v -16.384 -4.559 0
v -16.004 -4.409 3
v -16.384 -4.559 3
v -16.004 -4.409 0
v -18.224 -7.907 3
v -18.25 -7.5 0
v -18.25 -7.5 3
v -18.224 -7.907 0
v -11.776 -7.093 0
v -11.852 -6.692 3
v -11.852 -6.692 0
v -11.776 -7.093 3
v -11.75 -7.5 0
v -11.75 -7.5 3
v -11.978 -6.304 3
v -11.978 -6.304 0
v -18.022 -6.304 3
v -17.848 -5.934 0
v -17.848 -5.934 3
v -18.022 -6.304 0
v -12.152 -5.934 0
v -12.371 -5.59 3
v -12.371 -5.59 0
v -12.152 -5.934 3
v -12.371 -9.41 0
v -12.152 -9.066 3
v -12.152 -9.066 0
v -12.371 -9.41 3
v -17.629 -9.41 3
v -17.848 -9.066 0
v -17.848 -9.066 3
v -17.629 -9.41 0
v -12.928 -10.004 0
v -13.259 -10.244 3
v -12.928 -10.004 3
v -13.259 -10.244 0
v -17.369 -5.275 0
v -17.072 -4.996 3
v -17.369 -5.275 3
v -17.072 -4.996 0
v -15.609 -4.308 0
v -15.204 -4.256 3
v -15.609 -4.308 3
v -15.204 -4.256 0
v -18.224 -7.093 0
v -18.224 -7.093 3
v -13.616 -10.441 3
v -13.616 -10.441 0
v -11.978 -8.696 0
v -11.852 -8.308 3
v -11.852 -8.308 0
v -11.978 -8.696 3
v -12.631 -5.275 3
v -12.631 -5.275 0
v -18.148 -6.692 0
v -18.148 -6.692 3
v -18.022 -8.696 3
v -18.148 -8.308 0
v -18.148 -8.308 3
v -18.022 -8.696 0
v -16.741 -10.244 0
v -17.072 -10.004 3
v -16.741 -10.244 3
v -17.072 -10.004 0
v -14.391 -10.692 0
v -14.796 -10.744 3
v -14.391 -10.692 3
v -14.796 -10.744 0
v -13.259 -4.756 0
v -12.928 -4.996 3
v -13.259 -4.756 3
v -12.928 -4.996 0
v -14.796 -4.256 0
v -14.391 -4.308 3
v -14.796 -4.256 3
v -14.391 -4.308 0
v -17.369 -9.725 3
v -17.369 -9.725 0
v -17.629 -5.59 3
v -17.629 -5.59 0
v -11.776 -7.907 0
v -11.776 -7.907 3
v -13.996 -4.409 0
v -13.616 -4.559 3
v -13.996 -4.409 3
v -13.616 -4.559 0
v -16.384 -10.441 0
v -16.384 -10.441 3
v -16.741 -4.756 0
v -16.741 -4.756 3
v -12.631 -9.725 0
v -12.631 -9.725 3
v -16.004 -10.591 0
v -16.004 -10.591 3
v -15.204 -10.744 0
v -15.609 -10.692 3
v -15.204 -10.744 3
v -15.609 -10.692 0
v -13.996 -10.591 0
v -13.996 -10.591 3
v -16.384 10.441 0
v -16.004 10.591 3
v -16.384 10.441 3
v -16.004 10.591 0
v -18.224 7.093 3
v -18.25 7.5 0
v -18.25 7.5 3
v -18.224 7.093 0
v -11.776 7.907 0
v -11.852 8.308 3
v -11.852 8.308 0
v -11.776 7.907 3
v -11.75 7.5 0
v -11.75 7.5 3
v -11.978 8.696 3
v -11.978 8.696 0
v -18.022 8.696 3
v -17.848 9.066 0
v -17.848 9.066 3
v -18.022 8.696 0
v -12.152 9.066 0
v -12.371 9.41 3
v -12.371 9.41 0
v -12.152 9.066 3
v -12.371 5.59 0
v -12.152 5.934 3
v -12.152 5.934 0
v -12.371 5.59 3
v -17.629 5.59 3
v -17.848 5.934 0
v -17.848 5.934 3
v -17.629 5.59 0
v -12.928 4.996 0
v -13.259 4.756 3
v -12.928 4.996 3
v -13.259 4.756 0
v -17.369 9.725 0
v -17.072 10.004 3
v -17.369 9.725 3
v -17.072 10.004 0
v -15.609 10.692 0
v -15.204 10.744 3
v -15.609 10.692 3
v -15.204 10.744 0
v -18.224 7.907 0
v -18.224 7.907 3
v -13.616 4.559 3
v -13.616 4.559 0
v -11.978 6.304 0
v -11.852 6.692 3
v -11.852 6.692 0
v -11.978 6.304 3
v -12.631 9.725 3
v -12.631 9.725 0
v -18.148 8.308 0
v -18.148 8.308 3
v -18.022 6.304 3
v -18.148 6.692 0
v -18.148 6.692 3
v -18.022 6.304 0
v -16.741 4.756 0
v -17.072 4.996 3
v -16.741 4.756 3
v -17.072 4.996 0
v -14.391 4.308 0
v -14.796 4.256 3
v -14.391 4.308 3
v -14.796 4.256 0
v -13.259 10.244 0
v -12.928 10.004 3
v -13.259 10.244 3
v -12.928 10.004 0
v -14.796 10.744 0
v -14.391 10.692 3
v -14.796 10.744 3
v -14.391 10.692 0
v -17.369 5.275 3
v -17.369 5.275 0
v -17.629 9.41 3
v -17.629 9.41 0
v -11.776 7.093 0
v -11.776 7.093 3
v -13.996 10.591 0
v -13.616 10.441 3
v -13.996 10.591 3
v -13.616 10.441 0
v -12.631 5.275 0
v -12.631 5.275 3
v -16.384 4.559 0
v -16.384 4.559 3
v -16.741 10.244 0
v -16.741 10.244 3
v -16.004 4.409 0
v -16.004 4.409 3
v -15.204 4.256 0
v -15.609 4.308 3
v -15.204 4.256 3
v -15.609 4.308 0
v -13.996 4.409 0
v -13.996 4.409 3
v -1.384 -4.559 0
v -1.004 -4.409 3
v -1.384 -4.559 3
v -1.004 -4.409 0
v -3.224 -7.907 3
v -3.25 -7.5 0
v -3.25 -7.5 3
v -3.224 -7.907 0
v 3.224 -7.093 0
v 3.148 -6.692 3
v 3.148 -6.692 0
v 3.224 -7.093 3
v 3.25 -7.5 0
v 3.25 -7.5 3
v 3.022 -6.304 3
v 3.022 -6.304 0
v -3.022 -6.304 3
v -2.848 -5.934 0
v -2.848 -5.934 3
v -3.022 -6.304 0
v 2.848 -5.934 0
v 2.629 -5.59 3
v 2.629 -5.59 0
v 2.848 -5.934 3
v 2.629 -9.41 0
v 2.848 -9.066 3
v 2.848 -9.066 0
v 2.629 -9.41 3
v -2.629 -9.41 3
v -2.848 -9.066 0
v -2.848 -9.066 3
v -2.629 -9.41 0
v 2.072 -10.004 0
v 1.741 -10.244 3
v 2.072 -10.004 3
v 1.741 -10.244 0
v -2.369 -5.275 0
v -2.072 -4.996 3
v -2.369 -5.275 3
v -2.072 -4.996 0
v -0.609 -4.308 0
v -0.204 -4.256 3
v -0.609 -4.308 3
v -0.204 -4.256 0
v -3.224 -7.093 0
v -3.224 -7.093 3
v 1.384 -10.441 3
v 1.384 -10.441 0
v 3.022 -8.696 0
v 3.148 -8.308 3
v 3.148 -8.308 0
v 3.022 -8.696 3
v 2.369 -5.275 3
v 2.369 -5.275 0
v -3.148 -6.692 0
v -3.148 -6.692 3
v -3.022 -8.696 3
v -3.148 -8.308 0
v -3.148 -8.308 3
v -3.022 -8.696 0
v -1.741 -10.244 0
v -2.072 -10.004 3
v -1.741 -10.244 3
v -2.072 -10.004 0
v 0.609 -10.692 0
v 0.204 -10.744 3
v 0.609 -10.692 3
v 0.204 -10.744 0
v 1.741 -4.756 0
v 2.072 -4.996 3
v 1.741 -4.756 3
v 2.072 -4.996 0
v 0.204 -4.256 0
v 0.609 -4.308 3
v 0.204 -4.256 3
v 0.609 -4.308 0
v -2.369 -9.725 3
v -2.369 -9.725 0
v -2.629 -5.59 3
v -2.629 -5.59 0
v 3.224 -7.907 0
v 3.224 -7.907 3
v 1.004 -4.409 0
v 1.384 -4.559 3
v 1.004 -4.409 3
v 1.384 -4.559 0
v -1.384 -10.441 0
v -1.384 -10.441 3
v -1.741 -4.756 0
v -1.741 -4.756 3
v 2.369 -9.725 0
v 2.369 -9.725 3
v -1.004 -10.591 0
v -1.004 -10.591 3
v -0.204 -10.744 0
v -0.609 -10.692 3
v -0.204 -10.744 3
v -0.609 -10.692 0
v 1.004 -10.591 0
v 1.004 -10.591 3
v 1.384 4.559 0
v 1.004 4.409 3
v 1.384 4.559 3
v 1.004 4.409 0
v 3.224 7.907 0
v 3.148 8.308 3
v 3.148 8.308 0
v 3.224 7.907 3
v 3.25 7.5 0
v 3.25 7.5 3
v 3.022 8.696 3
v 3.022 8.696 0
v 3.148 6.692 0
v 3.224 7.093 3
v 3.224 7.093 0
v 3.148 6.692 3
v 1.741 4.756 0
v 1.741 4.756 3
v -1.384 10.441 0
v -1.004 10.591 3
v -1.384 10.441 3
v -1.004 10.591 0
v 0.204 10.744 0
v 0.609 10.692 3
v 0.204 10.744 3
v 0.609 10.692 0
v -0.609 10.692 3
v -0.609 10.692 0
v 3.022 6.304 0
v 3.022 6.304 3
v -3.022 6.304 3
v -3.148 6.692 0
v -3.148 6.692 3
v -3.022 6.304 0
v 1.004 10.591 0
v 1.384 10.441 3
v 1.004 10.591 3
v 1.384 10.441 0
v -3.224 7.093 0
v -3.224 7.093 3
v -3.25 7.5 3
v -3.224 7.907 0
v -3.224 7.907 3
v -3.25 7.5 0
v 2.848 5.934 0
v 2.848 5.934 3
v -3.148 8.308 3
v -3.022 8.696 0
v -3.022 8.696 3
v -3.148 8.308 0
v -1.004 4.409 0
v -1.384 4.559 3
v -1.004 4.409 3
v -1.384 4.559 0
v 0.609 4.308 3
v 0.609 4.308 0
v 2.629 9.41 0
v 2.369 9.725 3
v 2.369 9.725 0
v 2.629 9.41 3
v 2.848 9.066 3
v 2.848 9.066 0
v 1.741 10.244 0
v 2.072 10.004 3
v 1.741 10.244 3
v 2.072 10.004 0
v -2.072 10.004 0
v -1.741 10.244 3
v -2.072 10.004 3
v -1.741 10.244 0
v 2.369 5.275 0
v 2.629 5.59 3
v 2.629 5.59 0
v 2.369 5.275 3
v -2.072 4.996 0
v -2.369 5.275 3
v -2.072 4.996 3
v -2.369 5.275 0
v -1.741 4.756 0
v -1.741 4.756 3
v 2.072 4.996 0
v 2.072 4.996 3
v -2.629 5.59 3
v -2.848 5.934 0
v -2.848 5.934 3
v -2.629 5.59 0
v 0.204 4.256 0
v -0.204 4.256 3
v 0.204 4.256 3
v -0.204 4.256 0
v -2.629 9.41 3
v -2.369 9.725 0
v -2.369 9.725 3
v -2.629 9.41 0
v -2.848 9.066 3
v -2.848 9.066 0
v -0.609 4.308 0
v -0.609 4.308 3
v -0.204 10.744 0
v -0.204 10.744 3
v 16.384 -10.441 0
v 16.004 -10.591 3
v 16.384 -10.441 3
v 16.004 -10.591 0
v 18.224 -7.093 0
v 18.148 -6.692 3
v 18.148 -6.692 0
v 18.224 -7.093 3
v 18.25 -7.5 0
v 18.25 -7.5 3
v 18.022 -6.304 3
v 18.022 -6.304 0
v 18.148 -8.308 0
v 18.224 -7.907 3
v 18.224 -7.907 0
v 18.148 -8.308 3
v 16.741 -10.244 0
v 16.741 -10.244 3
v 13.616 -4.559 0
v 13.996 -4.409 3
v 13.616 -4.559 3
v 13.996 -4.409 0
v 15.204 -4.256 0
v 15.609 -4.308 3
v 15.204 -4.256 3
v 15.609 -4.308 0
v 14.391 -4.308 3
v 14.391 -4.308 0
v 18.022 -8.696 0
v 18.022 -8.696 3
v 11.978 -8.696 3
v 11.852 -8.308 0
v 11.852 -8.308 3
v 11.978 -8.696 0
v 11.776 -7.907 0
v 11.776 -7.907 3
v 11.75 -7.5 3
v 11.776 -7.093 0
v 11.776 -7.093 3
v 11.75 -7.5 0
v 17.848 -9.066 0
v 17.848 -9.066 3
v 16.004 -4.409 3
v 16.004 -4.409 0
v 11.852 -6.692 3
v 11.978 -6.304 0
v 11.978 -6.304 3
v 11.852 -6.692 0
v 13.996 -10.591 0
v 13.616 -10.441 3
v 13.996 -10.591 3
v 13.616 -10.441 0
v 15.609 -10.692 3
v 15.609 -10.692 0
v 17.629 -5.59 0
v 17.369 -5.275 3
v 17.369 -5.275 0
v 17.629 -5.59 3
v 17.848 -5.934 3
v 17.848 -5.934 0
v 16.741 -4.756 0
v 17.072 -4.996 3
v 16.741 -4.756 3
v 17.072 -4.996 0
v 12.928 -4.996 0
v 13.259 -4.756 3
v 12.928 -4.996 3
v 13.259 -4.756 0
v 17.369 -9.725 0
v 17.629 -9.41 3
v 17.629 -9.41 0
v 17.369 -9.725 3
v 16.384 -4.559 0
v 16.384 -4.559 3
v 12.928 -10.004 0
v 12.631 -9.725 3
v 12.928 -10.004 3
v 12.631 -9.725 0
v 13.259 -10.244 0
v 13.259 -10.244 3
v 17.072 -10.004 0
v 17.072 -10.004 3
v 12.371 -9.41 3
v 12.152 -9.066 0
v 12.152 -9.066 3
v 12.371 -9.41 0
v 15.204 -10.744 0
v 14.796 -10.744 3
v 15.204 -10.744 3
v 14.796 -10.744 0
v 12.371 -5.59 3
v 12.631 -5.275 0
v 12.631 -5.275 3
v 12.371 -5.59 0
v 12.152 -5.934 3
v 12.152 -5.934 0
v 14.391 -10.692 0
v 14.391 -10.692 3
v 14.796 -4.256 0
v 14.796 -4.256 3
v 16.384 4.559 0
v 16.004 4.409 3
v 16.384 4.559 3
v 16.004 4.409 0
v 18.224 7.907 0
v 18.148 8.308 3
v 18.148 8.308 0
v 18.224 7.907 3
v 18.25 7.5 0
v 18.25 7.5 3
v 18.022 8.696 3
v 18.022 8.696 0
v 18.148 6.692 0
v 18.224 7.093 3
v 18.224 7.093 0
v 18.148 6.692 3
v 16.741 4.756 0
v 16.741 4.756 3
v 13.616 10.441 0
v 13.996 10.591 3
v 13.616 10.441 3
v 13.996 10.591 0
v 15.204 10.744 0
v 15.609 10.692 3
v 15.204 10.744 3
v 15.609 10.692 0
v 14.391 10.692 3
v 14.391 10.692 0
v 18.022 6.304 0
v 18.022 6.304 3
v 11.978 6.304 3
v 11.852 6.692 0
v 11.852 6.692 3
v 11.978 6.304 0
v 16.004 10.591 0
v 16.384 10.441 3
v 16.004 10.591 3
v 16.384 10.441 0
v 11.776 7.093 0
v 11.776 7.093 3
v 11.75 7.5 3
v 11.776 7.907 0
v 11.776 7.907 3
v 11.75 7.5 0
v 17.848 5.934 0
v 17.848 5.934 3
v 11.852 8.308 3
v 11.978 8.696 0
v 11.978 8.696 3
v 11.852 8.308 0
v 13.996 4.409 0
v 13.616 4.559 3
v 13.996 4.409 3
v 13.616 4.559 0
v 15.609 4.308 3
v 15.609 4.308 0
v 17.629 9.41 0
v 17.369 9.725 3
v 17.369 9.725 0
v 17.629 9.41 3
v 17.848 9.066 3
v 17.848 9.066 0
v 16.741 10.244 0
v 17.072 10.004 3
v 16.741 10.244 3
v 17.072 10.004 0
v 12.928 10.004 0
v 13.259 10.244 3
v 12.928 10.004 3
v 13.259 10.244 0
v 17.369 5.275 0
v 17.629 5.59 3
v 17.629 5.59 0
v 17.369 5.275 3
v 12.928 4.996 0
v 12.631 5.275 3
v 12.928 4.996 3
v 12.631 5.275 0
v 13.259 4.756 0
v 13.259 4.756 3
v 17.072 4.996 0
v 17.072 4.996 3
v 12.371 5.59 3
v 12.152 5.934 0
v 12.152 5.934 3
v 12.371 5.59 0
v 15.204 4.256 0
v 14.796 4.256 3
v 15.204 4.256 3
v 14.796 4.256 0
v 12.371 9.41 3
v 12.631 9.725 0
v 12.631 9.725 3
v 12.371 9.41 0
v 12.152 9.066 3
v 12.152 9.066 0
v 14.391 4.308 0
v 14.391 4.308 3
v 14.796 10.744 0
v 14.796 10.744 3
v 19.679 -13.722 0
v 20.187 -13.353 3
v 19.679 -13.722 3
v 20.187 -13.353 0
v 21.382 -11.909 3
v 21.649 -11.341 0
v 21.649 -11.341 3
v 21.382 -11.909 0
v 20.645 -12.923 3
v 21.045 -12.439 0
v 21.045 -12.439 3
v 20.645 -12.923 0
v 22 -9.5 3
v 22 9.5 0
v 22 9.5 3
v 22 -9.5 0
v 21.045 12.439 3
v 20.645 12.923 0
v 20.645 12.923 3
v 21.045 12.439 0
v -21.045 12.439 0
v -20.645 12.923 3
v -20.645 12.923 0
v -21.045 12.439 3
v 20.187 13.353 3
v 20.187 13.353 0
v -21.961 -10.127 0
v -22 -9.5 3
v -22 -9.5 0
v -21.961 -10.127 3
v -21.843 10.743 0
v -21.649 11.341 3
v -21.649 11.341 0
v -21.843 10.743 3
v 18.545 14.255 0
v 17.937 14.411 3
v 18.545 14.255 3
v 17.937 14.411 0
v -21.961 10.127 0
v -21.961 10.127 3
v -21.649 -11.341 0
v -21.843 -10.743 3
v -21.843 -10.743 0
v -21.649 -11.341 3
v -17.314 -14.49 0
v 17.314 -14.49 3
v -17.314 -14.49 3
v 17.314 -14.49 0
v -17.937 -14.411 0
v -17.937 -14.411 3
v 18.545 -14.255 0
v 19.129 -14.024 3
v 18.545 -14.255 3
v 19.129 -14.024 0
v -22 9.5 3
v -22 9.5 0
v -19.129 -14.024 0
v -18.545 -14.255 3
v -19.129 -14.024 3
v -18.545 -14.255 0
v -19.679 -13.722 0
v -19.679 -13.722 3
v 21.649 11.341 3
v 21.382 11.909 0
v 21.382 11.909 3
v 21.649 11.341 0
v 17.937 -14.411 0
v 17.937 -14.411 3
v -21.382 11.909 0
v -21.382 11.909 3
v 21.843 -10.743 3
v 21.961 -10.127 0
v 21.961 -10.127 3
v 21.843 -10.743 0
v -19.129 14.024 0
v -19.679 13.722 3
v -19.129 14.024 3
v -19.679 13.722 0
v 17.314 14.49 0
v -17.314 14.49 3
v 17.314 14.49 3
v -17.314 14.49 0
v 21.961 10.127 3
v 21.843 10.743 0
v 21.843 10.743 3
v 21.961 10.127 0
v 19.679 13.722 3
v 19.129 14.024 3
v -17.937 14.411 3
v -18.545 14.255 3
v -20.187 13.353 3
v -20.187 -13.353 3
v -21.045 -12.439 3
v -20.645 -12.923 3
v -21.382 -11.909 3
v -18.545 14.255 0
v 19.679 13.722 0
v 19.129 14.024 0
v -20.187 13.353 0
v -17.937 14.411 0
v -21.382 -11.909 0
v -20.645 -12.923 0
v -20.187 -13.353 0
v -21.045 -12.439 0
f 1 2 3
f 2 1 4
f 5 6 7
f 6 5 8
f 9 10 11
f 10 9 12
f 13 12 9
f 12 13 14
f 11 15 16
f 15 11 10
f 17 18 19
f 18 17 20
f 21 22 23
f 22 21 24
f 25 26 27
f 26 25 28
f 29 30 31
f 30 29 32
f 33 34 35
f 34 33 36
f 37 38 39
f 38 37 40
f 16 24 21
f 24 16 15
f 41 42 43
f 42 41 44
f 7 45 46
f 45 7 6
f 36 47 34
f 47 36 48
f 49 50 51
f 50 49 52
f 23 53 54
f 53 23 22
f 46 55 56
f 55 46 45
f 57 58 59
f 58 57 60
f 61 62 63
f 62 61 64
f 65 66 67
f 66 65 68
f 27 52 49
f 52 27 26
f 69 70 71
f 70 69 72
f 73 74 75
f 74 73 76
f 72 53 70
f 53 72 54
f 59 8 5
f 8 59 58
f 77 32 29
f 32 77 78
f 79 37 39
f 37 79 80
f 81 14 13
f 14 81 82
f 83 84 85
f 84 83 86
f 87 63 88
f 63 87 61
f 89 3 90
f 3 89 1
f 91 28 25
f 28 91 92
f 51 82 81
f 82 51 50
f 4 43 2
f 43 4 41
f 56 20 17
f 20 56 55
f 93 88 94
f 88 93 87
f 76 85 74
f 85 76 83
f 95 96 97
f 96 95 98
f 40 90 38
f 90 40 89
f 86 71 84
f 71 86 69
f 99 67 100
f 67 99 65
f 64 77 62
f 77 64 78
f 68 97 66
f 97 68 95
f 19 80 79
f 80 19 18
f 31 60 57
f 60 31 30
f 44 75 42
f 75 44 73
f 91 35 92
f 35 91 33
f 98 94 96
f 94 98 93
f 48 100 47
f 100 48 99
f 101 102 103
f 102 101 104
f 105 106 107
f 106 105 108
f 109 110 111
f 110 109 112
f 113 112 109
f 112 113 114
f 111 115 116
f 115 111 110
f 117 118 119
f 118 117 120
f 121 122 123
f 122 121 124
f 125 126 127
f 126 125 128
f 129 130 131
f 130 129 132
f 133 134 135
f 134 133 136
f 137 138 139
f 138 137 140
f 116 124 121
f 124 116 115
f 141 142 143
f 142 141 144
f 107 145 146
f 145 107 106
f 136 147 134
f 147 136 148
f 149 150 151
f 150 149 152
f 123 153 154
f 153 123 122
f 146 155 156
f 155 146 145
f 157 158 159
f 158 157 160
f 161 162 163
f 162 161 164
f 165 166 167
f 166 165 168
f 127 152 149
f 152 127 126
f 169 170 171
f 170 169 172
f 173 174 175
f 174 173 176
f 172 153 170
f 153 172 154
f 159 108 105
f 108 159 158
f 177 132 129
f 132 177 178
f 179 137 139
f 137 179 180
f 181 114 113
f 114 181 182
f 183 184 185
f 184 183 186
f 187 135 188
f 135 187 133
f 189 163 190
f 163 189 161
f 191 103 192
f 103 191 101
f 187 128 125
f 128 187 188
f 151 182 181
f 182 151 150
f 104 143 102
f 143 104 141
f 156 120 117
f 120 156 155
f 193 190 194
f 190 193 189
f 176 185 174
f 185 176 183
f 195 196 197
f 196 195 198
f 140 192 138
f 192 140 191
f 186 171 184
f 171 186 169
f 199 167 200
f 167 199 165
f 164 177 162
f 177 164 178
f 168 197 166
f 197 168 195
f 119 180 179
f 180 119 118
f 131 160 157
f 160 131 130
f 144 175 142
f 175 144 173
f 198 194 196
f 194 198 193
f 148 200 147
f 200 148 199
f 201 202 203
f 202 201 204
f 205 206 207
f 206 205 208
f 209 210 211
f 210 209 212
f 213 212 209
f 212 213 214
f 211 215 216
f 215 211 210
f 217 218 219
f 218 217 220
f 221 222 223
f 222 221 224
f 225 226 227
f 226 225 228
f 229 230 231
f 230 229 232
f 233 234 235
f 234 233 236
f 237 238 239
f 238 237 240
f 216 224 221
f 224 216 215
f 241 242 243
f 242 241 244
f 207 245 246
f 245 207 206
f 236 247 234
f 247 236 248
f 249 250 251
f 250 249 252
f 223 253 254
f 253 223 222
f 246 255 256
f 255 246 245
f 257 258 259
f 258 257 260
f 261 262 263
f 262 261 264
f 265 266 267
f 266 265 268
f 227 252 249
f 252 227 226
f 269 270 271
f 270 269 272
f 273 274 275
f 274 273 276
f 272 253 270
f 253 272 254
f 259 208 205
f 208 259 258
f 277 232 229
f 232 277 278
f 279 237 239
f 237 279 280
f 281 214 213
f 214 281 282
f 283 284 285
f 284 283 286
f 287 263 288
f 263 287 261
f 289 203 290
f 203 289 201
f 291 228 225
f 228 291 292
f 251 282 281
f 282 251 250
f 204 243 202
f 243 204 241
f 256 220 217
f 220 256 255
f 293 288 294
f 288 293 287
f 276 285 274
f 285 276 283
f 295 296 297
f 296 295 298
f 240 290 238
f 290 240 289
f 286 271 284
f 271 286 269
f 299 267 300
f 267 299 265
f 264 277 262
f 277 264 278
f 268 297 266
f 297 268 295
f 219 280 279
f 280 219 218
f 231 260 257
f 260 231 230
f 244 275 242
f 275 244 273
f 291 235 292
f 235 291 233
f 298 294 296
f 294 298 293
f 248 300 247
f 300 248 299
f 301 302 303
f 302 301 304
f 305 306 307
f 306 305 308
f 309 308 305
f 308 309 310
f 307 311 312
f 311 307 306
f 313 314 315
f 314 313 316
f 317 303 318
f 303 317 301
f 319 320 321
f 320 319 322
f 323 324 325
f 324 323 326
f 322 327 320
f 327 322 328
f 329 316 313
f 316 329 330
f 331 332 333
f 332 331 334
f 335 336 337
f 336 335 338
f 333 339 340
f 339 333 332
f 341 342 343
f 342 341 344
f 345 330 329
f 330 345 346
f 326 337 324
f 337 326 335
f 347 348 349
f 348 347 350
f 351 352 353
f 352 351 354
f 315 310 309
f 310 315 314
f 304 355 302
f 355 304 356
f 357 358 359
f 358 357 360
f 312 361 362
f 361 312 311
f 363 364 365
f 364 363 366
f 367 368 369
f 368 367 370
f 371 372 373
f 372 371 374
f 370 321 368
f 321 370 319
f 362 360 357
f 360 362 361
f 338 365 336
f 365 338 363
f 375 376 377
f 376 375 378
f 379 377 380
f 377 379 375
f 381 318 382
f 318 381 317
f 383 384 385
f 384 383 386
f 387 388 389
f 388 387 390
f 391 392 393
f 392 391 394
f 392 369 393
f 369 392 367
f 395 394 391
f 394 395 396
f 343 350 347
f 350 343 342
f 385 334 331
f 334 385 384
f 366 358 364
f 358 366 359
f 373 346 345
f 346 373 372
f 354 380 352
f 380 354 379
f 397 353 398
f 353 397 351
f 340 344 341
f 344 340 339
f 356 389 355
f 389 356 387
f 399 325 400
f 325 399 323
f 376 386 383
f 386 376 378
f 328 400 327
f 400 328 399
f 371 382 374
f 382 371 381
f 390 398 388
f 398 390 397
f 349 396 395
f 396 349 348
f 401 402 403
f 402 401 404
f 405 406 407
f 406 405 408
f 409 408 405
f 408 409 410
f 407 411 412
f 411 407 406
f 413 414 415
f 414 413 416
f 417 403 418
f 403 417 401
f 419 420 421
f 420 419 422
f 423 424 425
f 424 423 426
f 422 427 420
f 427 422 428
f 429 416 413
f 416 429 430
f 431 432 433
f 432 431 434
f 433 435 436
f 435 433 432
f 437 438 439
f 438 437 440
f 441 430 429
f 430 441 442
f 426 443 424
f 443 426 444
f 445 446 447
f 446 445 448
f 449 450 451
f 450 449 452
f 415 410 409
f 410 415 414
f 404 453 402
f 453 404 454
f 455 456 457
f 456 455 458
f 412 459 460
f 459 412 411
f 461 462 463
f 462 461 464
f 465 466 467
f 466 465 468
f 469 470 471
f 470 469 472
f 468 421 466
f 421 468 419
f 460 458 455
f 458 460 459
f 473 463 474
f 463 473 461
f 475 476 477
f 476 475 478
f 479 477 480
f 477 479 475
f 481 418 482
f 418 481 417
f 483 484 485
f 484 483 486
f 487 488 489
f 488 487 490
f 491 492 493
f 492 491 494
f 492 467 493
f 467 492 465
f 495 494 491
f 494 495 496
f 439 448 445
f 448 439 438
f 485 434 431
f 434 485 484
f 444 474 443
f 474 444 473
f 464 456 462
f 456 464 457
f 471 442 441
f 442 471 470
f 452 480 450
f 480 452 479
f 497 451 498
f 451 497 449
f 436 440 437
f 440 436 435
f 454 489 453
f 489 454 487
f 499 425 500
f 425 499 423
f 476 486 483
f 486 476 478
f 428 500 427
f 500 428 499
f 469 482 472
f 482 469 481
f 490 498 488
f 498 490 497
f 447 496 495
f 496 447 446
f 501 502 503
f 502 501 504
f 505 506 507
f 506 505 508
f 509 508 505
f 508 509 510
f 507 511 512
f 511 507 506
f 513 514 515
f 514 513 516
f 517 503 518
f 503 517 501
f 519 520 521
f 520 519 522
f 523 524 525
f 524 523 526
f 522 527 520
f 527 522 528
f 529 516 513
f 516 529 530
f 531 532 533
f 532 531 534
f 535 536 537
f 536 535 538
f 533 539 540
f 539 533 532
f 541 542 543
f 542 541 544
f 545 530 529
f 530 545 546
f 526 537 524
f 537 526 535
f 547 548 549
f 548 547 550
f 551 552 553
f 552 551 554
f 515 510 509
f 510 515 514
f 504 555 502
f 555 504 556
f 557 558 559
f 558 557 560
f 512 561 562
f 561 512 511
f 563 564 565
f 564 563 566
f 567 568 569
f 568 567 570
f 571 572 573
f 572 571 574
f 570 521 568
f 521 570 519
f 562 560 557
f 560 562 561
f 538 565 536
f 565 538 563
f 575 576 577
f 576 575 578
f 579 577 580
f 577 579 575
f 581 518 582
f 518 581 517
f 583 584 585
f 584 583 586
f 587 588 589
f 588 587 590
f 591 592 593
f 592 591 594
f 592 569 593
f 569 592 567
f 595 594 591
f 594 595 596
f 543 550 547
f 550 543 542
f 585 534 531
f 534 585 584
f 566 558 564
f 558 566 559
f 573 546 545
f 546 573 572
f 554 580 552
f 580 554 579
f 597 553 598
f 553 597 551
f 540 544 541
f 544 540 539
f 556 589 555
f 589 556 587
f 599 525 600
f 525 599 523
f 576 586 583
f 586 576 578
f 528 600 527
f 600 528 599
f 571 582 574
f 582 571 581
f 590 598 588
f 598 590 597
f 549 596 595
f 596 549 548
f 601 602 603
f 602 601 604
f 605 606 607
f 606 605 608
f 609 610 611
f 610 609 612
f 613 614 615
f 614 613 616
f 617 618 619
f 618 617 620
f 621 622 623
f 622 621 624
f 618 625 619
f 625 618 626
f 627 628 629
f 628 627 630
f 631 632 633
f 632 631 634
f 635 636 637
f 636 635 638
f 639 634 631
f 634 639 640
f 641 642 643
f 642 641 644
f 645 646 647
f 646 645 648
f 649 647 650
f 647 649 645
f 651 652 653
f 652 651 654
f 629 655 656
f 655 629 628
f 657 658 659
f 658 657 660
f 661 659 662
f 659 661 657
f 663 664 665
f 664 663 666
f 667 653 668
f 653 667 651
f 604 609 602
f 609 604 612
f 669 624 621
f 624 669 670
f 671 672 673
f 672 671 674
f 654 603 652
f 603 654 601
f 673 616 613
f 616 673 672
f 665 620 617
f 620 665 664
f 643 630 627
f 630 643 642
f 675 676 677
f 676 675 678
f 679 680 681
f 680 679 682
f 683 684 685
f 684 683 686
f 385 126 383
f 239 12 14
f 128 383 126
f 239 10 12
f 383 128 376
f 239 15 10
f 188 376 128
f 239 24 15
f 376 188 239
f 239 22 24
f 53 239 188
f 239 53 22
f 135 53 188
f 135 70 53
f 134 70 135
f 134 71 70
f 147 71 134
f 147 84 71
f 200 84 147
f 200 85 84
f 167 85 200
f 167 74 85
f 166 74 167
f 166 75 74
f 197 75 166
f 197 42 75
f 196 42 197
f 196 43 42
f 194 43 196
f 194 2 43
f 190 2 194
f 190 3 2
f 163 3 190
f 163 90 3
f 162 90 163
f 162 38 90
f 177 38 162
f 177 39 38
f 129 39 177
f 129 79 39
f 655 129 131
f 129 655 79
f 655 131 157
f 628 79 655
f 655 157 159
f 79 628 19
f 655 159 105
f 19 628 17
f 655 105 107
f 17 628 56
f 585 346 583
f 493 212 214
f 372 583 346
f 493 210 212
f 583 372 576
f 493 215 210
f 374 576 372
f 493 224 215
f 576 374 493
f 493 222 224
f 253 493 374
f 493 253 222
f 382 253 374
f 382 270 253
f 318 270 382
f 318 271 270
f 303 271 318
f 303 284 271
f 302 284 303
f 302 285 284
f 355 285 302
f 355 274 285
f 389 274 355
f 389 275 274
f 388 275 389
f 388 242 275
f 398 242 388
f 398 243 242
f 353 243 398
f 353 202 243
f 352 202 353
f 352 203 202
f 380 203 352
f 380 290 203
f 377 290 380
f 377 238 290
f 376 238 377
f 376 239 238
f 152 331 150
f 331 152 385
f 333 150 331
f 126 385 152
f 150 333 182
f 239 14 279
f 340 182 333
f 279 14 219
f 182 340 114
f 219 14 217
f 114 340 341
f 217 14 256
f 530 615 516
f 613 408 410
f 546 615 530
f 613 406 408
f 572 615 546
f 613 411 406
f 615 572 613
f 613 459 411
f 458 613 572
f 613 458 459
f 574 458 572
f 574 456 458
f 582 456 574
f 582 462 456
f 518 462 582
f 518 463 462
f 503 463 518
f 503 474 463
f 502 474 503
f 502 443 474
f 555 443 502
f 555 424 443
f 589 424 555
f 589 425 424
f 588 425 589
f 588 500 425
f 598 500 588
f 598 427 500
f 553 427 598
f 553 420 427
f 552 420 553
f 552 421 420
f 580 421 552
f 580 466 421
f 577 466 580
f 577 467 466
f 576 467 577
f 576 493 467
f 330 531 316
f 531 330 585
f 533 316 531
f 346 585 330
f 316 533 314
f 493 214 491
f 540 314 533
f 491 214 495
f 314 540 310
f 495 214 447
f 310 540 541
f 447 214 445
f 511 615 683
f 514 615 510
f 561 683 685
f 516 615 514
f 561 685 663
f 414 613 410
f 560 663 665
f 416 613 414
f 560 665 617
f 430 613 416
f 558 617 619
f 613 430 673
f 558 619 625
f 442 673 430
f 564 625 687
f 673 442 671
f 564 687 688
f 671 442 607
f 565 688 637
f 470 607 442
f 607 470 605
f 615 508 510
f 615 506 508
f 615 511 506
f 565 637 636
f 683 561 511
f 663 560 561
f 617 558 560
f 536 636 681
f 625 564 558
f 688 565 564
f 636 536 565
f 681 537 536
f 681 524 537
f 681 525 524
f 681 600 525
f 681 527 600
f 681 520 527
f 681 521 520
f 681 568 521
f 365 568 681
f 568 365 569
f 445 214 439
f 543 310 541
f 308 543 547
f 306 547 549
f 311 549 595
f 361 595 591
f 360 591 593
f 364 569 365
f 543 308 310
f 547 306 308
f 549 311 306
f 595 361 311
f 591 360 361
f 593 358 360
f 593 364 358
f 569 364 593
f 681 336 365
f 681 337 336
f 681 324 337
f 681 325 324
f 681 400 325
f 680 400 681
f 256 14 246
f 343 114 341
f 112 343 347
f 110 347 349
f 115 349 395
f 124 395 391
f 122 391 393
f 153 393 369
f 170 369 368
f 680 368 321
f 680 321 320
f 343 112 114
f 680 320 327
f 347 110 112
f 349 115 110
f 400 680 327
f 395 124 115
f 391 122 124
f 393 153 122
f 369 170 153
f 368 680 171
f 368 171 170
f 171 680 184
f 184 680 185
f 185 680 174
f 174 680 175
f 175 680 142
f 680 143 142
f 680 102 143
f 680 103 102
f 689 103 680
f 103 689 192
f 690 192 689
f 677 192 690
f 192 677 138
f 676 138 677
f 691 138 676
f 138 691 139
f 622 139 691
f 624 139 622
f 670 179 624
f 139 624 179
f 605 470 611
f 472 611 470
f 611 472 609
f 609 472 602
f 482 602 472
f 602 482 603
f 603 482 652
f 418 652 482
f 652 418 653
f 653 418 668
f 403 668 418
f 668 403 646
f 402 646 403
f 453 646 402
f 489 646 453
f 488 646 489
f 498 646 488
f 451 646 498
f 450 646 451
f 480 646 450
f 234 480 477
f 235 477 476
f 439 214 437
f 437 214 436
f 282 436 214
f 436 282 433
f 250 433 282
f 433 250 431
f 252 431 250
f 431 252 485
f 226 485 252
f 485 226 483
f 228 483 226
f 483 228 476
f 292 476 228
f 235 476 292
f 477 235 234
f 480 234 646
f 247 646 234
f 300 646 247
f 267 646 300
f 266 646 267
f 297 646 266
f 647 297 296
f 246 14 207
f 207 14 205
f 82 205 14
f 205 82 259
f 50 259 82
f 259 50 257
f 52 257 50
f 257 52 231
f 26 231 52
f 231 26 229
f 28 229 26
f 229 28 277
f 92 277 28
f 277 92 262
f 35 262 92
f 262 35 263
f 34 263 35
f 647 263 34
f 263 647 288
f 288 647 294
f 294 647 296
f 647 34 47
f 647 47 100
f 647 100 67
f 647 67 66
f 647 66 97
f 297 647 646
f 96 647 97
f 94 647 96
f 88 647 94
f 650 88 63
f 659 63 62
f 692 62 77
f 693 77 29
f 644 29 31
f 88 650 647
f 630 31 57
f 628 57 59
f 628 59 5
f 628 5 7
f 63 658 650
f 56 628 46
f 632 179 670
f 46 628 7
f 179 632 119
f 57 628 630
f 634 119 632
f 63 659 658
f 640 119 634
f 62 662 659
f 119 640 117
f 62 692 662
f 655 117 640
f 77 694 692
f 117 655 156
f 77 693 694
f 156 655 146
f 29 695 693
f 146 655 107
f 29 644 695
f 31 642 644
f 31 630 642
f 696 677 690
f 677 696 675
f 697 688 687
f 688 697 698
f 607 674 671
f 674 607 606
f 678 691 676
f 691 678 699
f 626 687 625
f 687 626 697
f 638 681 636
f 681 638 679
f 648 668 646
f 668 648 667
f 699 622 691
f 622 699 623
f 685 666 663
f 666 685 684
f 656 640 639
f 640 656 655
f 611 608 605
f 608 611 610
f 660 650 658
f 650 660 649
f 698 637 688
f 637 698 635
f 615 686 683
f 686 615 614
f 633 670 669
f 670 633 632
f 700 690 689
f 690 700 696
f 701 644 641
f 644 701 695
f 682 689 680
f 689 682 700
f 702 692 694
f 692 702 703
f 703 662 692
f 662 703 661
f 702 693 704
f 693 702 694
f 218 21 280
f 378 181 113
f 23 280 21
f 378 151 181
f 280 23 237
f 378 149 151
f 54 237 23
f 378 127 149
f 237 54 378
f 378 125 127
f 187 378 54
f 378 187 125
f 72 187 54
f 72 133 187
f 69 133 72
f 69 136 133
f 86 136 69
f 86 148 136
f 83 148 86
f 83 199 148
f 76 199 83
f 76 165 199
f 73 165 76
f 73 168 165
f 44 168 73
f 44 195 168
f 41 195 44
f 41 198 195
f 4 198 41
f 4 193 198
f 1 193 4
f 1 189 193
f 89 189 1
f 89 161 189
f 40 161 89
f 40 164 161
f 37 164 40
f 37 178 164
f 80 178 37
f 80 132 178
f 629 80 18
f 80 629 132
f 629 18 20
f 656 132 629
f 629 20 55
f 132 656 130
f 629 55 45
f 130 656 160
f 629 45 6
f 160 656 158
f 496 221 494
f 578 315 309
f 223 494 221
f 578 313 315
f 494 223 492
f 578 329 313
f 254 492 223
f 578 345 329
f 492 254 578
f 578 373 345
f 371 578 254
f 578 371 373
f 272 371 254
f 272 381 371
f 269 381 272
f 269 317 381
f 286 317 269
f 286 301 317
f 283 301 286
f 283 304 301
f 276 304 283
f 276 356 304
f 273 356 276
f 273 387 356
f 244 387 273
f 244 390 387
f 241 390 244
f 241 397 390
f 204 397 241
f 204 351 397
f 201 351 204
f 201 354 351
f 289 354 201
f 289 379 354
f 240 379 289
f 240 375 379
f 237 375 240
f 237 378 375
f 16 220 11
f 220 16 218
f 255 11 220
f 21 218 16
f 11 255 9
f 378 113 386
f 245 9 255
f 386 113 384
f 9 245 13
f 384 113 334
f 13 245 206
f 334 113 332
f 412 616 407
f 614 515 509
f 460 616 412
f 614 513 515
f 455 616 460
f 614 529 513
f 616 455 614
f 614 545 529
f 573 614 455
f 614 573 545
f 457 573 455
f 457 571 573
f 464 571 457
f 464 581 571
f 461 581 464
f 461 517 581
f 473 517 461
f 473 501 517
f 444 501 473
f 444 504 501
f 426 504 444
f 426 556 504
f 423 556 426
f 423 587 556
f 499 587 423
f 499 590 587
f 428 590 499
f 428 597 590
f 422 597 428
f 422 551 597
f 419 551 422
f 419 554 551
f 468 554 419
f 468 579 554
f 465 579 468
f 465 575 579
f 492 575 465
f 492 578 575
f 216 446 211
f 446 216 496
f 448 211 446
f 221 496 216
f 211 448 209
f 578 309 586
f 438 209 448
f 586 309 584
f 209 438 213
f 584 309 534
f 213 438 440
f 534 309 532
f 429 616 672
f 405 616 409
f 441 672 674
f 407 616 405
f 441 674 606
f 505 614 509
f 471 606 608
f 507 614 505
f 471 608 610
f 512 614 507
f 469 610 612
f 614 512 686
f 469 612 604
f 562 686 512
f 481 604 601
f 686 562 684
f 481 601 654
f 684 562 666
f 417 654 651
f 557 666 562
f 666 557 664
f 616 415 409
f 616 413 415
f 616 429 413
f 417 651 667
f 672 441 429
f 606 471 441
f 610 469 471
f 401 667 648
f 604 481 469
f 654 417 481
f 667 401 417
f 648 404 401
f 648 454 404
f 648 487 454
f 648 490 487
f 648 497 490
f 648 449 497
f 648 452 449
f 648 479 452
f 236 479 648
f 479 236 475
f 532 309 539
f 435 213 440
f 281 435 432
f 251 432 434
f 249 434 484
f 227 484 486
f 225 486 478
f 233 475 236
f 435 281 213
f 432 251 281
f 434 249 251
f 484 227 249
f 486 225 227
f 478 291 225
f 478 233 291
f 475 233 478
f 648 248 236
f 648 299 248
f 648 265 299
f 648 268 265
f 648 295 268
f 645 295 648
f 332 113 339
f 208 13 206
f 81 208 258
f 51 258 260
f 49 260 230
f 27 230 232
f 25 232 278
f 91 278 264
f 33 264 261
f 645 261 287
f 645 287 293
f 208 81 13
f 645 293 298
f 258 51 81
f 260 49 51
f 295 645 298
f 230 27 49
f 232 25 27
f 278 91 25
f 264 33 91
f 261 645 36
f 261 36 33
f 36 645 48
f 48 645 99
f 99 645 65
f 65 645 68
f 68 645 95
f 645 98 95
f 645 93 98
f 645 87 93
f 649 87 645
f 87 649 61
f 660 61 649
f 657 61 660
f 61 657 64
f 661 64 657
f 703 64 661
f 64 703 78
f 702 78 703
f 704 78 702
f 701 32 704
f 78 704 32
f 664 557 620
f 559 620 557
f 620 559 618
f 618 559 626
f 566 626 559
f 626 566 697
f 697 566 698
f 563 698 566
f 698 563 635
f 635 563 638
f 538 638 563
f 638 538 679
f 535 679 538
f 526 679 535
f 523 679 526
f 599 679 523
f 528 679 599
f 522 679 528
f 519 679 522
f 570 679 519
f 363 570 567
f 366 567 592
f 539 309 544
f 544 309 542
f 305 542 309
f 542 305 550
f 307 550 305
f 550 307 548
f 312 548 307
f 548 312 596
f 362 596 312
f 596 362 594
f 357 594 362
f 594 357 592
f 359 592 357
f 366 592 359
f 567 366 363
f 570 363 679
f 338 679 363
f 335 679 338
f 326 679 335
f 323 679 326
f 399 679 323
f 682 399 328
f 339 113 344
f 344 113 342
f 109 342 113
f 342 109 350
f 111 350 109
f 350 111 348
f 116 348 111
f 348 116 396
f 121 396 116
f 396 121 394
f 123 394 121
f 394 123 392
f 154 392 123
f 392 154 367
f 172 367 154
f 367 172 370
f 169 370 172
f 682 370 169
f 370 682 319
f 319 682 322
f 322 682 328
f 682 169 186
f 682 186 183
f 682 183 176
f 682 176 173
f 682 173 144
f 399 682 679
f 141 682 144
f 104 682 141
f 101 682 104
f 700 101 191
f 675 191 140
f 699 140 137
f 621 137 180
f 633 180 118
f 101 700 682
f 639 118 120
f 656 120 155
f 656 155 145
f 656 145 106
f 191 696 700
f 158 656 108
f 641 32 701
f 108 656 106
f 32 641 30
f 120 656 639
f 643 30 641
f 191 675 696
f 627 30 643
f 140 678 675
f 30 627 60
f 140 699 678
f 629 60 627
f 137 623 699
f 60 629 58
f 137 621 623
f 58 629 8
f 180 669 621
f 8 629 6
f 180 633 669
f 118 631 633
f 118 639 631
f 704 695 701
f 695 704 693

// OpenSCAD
// Generated by SolidPython 1.1.3 on 2023-03-12 21:52:20
$fn = 50;


difference() {
	union() {
		translate(v = [0, 0, 0]) {
			rotate(a = [0, 0, 0]) {
				hull() {
					translate(v = [-17.0000000000, 9.5000000000, 0]) {
						rotate(a = [0, 0, 0]) {
							translate(v = [0, 0, 0]) {
								rotate(a = [0, 0, 0]) {
									cylinder(h = 3, r = 5);
								}
							}
						}
					}
					translate(v = [17.0000000000, 9.5000000000, 0]) {
						rotate(a = [0, 0, 0]) {
							translate(v = [0, 0, 0]) {
								rotate(a = [0, 0, 0]) {
									cylinder(h = 3, r = 5);
								}
							}
						}
					}
					translate(v = [-17.0000000000, -9.5000000000, 0]) {
						rotate(a = [0, 0, 0]) {
							translate(v = [0, 0, 0]) {
								rotate(a = [0, 0, 0]) {
									cylinder(h = 3, r = 5);
								}
							}
						}
					}
					translate(v = [17.0000000000, -9.5000000000, 0]) {
						rotate(a = [0, 0, 0]) {
							translate(v = [0, 0, 0]) {
								rotate(a = [0, 0, 0]) {
									cylinder(h = 3, r = 5);
								}
							}
						}
					}
				}
			}
		}
	}
	union() {
		translate(v = [-15.0000000000, -7.5000000000, 0]) {
			rotate(a = [0, 0, 0]) {
				translate(v = [0, 0, -50]) {
					rotate(a = [0, 0, 0]) {
						cylinder(h = 100, r = 3.2500000000);
					}
				}
			}
		}
		translate(v = [-15.0000000000, 7.5000000000, 0]) {
			rotate(a = [0, 0, 0]) {
				translate(v = [0, 0, -50]) {
					rotate(a = [0, 0, 0]) {
						cylinder(h = 100, r = 3.2500000000);
					}
				}
			}
		}
		translate(v = [0.0000000000, -7.5000000000, 0]) {
			rotate(a = [0, 0, 0]) {
				translate(v = [0, 0, -50]) {
					rotate(a = [0, 0, 0]) {
						cylinder(h = 100, r = 3.2500000000);
					}
				}
			}
		}
		translate(v = [0.0000000000, 7.5000000000, 0]) {
			rotate(a = [0, 0, 0]) {
				translate(v = [0, 0, -50]) {
					rotate(a = [0, 0, 0]) {
						cylinder(h = 100, r = 3.2500000000);
					}
				}
			}
		}
		translate(v = [15.0000000000, -7.5000000000, 0]) {
			rotate(a = [0, 0, 0]) {
				translate(v = [0, 0, -50]) {
					rotate(a = [0, 0, 0]) {
						cylinder(h = 100, r = 3.2500000000);
					}
				}
			}
		}
		translate(v = [15.0000000000, 7.5000000000, 0]) {
			rotate(a = [0, 0, 0]) {
				translate(v = [0, 0, -50]) {
					rotate(a = [0, 0, 0]) {
						cylinder(h = 100, r = 3.2500000000);
					}
				}
			}
		}
	}
}
/***********************************************
*********      SolidPython code:      **********
************************************************
 
from solid import *
import os
import subprocess

import oomB

import opsc_library_gen

mode = "laser"
#mode = "3d_print"

defined_objects = {}

radius_dict = {}
countersunk_dict = {}


def set_mode(m):
    global mode
    mode = m
    radius_dict['M6'] = 6.5/2
    radius_dict['M3'] = 3.3/2
    if mode == "laser":
        radius_dict['M6'] = 6/2
        radius_dict['M3'] = 3/2

    countersunk_dict['M3'] = {}
    countersunk_dict['M3']['little_rad'] = radius_dict['M3']
    countersunk_dict['M3']['big_rad'] = (5.5+0.6)/2
    if mode == "laser":
        countersunk_dict['M3']['big_rad'] = (4.75+0.6)/2
        countersunk_dict['M3']['little_rad'] = (4.75+0.6)/2

    countersunk_dict['M3']['height'] = 1.7


def opsc_make_object(filename, objects, save_type="none",resolution=50, layers = 1, tilediff = 200, mode="laser", overwrite=True):
    if overwrite or not os.path.exists(filename):
        set_mode(mode)
        save_type = save_type.lower()
        os.makedirs(os.path.dirname(filename), exist_ok=True)
        final_object = opsc_get_object(objects, mode = mode)
        # Save the final object to the specified filename    
        scad_render_to_file(final_object, filename, file_header='$fn = %s;' % resolution, include_orig_code=True)
        if mode == "laser":
            filename_laser = filename.replace(".scad","-flat.scad")
            scad_render_to_file(getLaser(final_object, layers=layers, tilediff=tilediff), filename_laser, file_header='$fn = %s;' % resolution, include_orig_code=True)
            if save_type == "all":
                saveToAll(filename_laser)
            elif save_type == "dxf":
                saveToDxf(filename_laser)
        if save_type == "all":
            saveToAll(filename)
        elif save_type == "dxf":
            saveToDxf(filename)


def opsc_get_object(objects, mode = "laser"):
    # Create the solidpython objects only include the positive objects and if they don't have inclusion or their inclusion is either all or mode
    # Initialize an empty list to store the results
    positive_objects = []

    # Iterate over the "objects" list
    for obj in objects:
        # Check if the current object has a "type" key with a value of "positive"
        if obj['type'] == 'positive':
            # Check if the current object has an "inclusion" key and its value matches "mode",
            # or if the current object does not have an "inclusion" key at all
            if not 'inclusion' in obj or obj['inclusion'] == "all" or obj['inclusion'] == mode:
                # Call the "get_opsc_item" function with the current object as an argument
                opsc_item = get_opsc_item(obj)
                # Add the result to the "positive_objects" list
                positive_objects.append(opsc_item)
# Initialize an empty list to store the results
    negative_objects = []

    # Iterate over the "objects" list
    for obj in objects:
        # Check if the current object has a "type" key with a value of "negative"
        if obj['type'] == 'negative':
            # Check if the current object has an "inclusion" key and its value matches "mode",
            # or if the current object does not have an "inclusion" key at all
            if not 'inclusion' in obj or obj['inclusion'] == "all" or obj['inclusion'] == mode:
                # Call the "get_opsc_item" function with the current object as an argument
                opsc_item = get_opsc_item(obj)
                # Add the result to the "negative_objects" list
                negative_objects.append(opsc_item)
    
    #positive_objects = [get_opsc_item(obj) for obj in objects if obj['type'] == 'positive']
    #negative_objects = [get_opsc_item(obj) for obj in objects if obj['type'] == 'negative']
    # Union the positive objects
    positive_object = union()(*positive_objects)
    # Union the negative objects
    negative_object = union()(*negative_objects)
    # Create the final object by subtracting the negative objects from the positive objects
    return difference()(positive_object, negative_object)

def get_opsc_item(params):
    # A dictionary to map radius string values to numerical values
    #radius_dict = {'small': 5, 'medium': 10, 'large': 15}
    # An array of function names for basic shapes
    basic_shapes = ['cube', 'sphere', 'cylinder']
    
    # An array of function names for other shapes
    other_shapes = ['hole', 'slot', 'rounded_rectangle', 'countersunk']
    


    # Convert radius to r if present, and remove radius from the params dictionary
    if 'radius' in params:
        if isinstance(params['radius'], str):
            # Use the radius_dict to map the radius string value to a numerical value
            params['r'] = radius_dict[params['radius']]
        else:
            params['r'] = params['radius']
        del params['radius']
    

    # Check if the object type is a basic shape
    if params['shape'] in basic_shapes:
        # Remove shape and unexpected dictionary values
        allowed_keys = {'size', 'r', 'r1', 'r2', 'd', 'h', 'rw', 'rh', 'dw', 'dh'}
        shape_params = {k: v for k, v in params.items() if k in allowed_keys}

        # Call the corresponding function for the shape parameter, using ** notation to pass the shape_params dictionary as keyword arguments
        return get_opsc_transform(params,globals()[params['shape']](**shape_params))
    
    # If the object type is not a basic shape, check if it's a defined object or one of the other shapes
    elif params['shape'] in other_shapes:
        # Call the corresponding function for the shape parameter, passing the params dictionary as an argument
        p2 = copy.deepcopy(params)
        p2["pos"] = [0,0,0]
        return get_opsc_transform(params,globals()[params['shape']](p2))
    
    # If the object is not a basic shape or a defined object, try to import it from a .scad file
    else:
        obj = defined_objects[params['shape']]
        return get_opsc_transform(params,obj)

def get_opsc_transform(params, solid_obj):
    # Rotate the object based on the 'rot' field in the params dictionary, or the 'rotX', 'rotY', and 'rotZ' fields if 'rot' is not present
    rot = params.get('rot', [])
    if rot:
        rotX, rotY, rotZ = rot
    else:
        rotX = params.get('rotX', 0)
        rotY = params.get('rotY', 0)
        rotZ = params.get('rotZ', 0)
    solid_obj = rotate([rotX, rotY, rotZ])(solid_obj)

    # Translate the object based on the 'pos' field in the params dictionary, or the 'x', 'y', and 'z' fields if 'pos' is not present
    pos = params.get('pos', [])
    if pos:
        x, y, z = pos
    else:
        x = params.get('x', 0)
        y = params.get('y', 0)
        z = params.get('z', 0)
    solid_obj = translate([x, y, z])(solid_obj)
    return solid_obj


import random

def opsc_easy_array(type, shape, repeats, pos_start, shift_arr, **kwargs):
    for i in range(0,3):
        repeats.append(1)
        pos_start.append(0)
        shift_arr.append(0)
    return_objects = []

    for x in range(0,repeats[0]):
        for y in range(0,repeats[1]):
            for z in range(0,repeats[2]):
                return_objects.append(opsc_easy(type, shape, pos=[pos_start[0]+x*shift_arr[0],pos_start[1]+y*shift_arr[1],pos_start[2]+z*shift_arr[2]], **kwargs))
    return return_objects                



def opsc_easy(type, shape, **kwargs):
    obj = {
        'type': type,
        'shape': shape
    }
    for param in ['size', 'r', 'r1', 'r2', 'd', 'h', 'rw', 'rh', 'dw', 'dh', 'pos', 'x', 'y', 'z', 'rot', 'rotX', 'rotY', 'rotZ', "w", "inclusion"]:
        if param in kwargs:
            obj[param] = kwargs[param]
    return obj

def hole(params):
    p2 = copy.deepcopy(params)  
    # Check if the radius is a string and replace it with the corresponding value from the dictionary
    if isinstance(p2['r'], str):
        p2['r'] = radius_dict[p2['r']]
    
    # Set the height to 100 if not specified
    if 'h' not in p2:
        p2['h'] = 100
        p2["pos"] = [0,0,-50]
    p2["center"] = True
    # Create the cylinder object
    p2["shape"] = "cylinder"
    p2["type"] = "positive"

    return get_opsc_item(p2)

import copy

def countersunk(params):
    p2 = copy.deepcopy(params)
    counter_rad = p2['r']
    p2['r'] = radius_dict[p2['r']]
    hp = copy.deepcopy(p2)
    hp["type"] = "positive"
    hp["shape"] = "hole"
    del hp["rot"]
    hol = get_opsc_item(hp)
    
    cp = copy.deepcopy(p2)
    cp["h"] = countersunk_dict[counter_rad]["height"]
    cp["r2"] = countersunk_dict[counter_rad]["little_rad"]
    cp["r1"] = countersunk_dict[counter_rad]["big_rad"]
    del cp["r"]
    del cp["rot"]
    cp["type"] = "positive"
    cp["shape"] = "cylinder"
    cp["pos"] = [0,0,0]

    top = get_opsc_item(cp)
    return union()(hol,top)



def slot(params):  
    p2 = copy.deepcopy(params) 
    if isinstance(p2['r'], str):
        p2['r'] = radius_dict[p2['r']]
    p2["type"] = "positive"
    p2["shape"] = "hole"
    del p2["rot"]
    p2["pos"] = [0,0,0]
    left = copy.deepcopy(p2)
    right = copy.deepcopy(p2)
    left["pos"][0] = p2["w"] / 2 - p2["r"] 
    
    right["pos"][0] = -p2["w"] / 2 + p2["r"] 
    pass
    leftObj = get_opsc_item(left)
    rightObj = get_opsc_item(right)
    return hull()(leftObj, rightObj)

def rounded_rectangle(params):   
    p2 = copy.deepcopy(params) 
    p2["h"] = p2["size"][2]
    p2["pos"] = p2.get("pos", [0, 0, 0]) 
    p2["type"] = "positive"
    p2["shape"] = "hole"
    p2["pos"] = [0,0,0]
    
    if 'rot' in p2:
        del p2["rot"]   
    if 'r' not in p2:
        p2["r"] = 5 
    tl = copy.deepcopy(p2)
    tr = copy.deepcopy(p2)
    bl = copy.deepcopy(p2)
    br = copy.deepcopy(p2)
    tl["pos"][0] = -(p2["size"][0] - p2["r"]*2)/2
    tl["pos"][1] = (p2["size"][1] - p2["r"]*2)/2
    tr["pos"][0] = (p2["size"][0] - p2["r"]*2)/2
    tr["pos"][1] = (p2["size"][1] - p2["r"]*2)/2
    bl["pos"][0] = -(p2["size"][0] - p2["r"]*2)/2
    bl["pos"][1] = -(p2["size"][1] - p2["r"]*2)/2
    br["pos"][0] = (p2["size"][0] - p2["r"]*2)/2
    br["pos"][1] = -(p2["size"][1] - p2["r"]*2)/2
    del tl["size"]
    del tr["size"]
    del bl["size"]
    del br["size"]
    tlo = get_opsc_item(tl)
    tro = get_opsc_item(tr)
    blo = get_opsc_item(bl)
    bro = get_opsc_item(br)    
    return hull()(tlo, tro, blo, bro)



def import_scad_object(filename):
    # Import the .scad file and convert it to a solidpython object
    #filename = "parts"
    obj = import_scad(filename)
    return obj.main()
    


import os
import solid as solidpython

# A dictionary to store the defined objects


def load_scad_objects():
    opsc_library_gen.gen_library(defined_objects)

import random

def test(num_objects):
    objects = []
    for i in range(num_objects):
        # Choose a random shape
        #shape = random.choice(['cube', 'sphere', 'cylinder', 'hole', 'slot', "rounded_rectangle"])
        shape = random.choice(["rounded_rectangle"])

        # Choose a random type
        type = random.choice(['positive', 'negative'])
        
        # Create an empty object dictionary
        obj = {'shape': shape, 'type': type}
        
        # Set shape-specific parameters
        if obj['shape'] in ['cube']:
            obj['size'] =  [random.uniform(5, 15), random.uniform(5, 15), random.uniform(5, 15)]
        if obj['shape'] in ['rounded_rectangle']:
            obj['size'] =  [random.uniform(5, 15), random.uniform(5, 15), random.uniform(5, 15)]
            obj['r'] = random.uniform(0.5, 5)
        elif obj['shape'] == 'sphere':
            obj['r'] = random.uniform(5, 15)
        elif obj['shape'] in ['cylinder', 'hole']:
            obj['r'] = random.uniform(0.5, 5)
            obj['h'] = random.uniform(5, 15)
        elif obj['shape'] == 'slot':
            obj['r'] = random.uniform(0.5, 5)
            obj['h'] = random.uniform(5, 15)
            obj['w'] = random.uniform(5, 15)
        
        # Set a random position and rotation
        obj['pos'] = [random.uniform(-20, 20), random.uniform(-20, 20), random.uniform(-20, 20)]
        obj['rot'] = [random.uniform(-180, 180), random.uniform(-180, 180), random.uniform(-180, 180)]
        
        # Add the object to the list
        objects.append(obj)
    return objects

####### old file saving
def saveToAll(fileIn):
    saveToDxf(fileIn)
    saveToPng(fileIn)
    saveToStl(fileIn)
    saveToSvg(fileIn)

def saveToDxf(fileIn, fileOut="", copy_to_laser=True):
    if fileOut == "":
        fileOut = fileIn.replace(".scad",".dxf")
    saveToFile(fileIn, fileOut)


    
def saveToPng(fileIn, fileOut="",extra="--render"):
    if fileOut == "":
        fileOut = fileIn.replace(".scad",".png")
    saveToFile(fileIn, fileOut)

def saveToStl(fileIn, fileOut=""):
    if fileOut == "":
        fileOut = fileIn.replace(".scad",".stl")
    saveToFile(fileIn, fileOut)
    
def saveToSvg(fileIn, fileOut=""):
    if fileOut == "":
        fileOut = fileIn.replace(".scad",".svg")
    saveToFile(fileIn, fileOut)

def saveToFile(fileIn, fileOut,extra=""):
    #extra = extra + " --colorscheme Tomorrow"

    launchStr = 'openscad -o "' + fileOut + '"' + extra + ' "' + fileIn + '"'
    if ".png" in fileOut:
        launchStr = launchStr + " --render"
    print("            saveToFile launch string: " + launchStr)
    subprocess.run(launchStr)
    x=0

def getLaser(final_object,start=1.5,layers=1,thickness=3,tilediff=200):
        rv= []

        for x in range(layers):
            rv.append(translate([0,x*tilediff,0])(
                    projection()(
                        intersection()(translate([-500,-500,start+x*thickness])(cube(size=[1000,1000,0.1])),
                            final_object
                        )
                    )
            )
            )
            
        return union()(rv)

set_mode("laser")
load_scad_objects() 
 
************************************************/
